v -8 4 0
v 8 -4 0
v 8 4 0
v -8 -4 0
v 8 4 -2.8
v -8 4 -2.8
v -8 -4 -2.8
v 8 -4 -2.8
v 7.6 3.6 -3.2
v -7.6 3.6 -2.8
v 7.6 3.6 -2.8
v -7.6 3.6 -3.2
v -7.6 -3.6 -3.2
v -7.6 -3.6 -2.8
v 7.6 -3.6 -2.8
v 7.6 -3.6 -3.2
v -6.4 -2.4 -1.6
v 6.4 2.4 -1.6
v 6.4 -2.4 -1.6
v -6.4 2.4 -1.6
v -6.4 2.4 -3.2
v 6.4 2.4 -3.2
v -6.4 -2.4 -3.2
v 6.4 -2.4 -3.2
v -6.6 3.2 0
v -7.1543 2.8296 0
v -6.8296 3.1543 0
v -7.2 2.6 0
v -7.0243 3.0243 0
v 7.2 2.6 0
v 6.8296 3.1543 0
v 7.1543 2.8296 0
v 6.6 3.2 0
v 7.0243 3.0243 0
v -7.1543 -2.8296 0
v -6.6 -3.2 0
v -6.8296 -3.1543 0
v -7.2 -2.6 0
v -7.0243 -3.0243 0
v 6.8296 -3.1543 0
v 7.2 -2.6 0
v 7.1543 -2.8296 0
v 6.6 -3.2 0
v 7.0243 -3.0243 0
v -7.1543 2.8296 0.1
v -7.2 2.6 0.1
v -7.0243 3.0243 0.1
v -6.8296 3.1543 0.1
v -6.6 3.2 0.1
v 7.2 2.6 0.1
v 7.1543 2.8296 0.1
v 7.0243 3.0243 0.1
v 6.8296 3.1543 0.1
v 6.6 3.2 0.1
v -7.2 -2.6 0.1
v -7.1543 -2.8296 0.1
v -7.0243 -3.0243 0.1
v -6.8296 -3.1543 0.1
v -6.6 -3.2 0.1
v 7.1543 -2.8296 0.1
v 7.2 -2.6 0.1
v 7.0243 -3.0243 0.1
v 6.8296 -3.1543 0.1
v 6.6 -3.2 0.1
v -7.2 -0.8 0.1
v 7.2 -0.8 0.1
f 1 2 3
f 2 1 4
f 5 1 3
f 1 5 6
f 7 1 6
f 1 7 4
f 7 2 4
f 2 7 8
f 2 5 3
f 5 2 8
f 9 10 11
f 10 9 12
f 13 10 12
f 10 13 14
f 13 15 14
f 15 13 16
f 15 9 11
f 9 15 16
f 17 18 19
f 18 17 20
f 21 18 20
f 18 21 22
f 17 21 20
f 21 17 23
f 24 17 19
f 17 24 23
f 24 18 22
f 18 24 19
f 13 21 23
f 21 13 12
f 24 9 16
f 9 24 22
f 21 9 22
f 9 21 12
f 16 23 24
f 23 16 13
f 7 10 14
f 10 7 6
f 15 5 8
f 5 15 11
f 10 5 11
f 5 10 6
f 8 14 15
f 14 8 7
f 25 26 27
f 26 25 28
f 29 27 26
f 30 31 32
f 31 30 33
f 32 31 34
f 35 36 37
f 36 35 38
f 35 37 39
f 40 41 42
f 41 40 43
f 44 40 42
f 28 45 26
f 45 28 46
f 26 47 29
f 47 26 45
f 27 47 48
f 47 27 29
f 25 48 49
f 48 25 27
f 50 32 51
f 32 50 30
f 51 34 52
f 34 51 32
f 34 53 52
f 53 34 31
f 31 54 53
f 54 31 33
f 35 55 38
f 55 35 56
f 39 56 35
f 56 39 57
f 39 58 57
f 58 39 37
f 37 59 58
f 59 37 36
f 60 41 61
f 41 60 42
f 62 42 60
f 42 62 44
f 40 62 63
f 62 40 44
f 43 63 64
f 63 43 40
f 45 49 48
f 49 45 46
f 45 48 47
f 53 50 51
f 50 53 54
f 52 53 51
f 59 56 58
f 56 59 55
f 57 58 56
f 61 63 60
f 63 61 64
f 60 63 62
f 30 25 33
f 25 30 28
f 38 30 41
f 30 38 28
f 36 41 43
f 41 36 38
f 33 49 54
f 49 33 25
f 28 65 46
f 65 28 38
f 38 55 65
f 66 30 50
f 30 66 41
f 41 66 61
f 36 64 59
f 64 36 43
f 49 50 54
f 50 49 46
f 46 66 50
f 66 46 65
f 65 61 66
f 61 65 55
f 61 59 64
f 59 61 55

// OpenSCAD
// file: ../p/box5.scad
use <../lib.scad>
function ldraw_lib__box5() = [
// 0 Box with 5 Faces and All Edges
// 0 Name: box5.dat
// 0 Author: James Jessiman
// 0 !LDRAW_ORG Primitive UPDATE 2012-01
// 0 !LICENSE Licensed under CC BY 4.0 : see CAreadme.txt
// 
// 0 BFC CERTIFY CCW
  [0,"BFC","CERTIFY"],
  [0,"BFC","CCW"],
// 
// 0 !HISTORY 2002-04-03 [sbliss] Modified for BFC compliance
// 0 !HISTORY 2002-04-25 [PTadmin] Official Update 2002-02
// 0 !HISTORY 2007-06-24 [PTadmin] Header formatted for Contributor Agreement
// 0 !HISTORY 2008-07-01 [PTadmin] Official Update 2008-01
// 0 !HISTORY 2012-02-16 [Philo] Changed to CCW
// 0 !HISTORY 2012-03-30 [PTadmin] Official Update 2012-01
// 
// 
// 2 24 1 1 1 -1 1 1
  [2,24,1,1,1,-1,1,1],
// 2 24 -1 1 1 -1 1 -1
  [2,24,-1,1,1,-1,1,-1],
// 2 24 -1 1 -1 1 1 -1
  [2,24,-1,1,-1,1,1,-1],
// 2 24 1 1 -1 1 1 1
  [2,24,1,1,-1,1,1,1],
// 2 24 1 0 1 -1 0 1
  [2,24,1,0,1,-1,0,1],
// 2 24 -1 0 1 -1 0 -1
  [2,24,-1,0,1,-1,0,-1],
// 2 24 -1 0 -1 1 0 -1
  [2,24,-1,0,-1,1,0,-1],
// 2 24 1 0 -1 1 0 1
  [2,24,1,0,-1,1,0,1],
// 2 24 1 0 1 1 1 1
  [2,24,1,0,1,1,1,1],
// 2 24 -1 0 1 -1 1 1
  [2,24,-1,0,1,-1,1,1],
// 2 24 1 0 -1 1 1 -1
  [2,24,1,0,-1,1,1,-1],
// 2 24 -1 0 -1 -1 1 -1
  [2,24,-1,0,-1,-1,1,-1],
// 4 16 -1 1 1 1 1 1 1 1 -1 -1 1 -1
  [4,16,-1,1,1,1,1,1,1,1,-1,-1,1,-1],
// 4 16 -1 1 1 -1 0 1 1 0 1 1 1 1
  [4,16,-1,1,1,-1,0,1,1,0,1,1,1,1],
// 4 16 -1 1 -1 -1 0 -1 -1 0 1 -1 1 1
  [4,16,-1,1,-1,-1,0,-1,-1,0,1,-1,1,1],
// 4 16 1 1 -1 1 0 -1 -1 0 -1 -1 1 -1
  [4,16,1,1,-1,1,0,-1,-1,0,-1,-1,1,-1],
// 4 16 1 1 1 1 0 1 1 0 -1 1 1 -1
  [4,16,1,1,1,1,0,1,1,0,-1,1,1,-1],
];
module ldraw_lib__box5(step=0, col=false, unit=2/5, alt=false, line=0.2, solid=!$preview)
    makepoly(ldraw_lib__box5(), step=step, col=col, unit=unit, alt=alt, line=line, solid=solid);
ldraw_lib__box5(line=0.2);
// file: ../p/box4.scad
use <../lib.scad>
function ldraw_lib__box4() = [
// 0 Box with 4 Faces (2 Parallel Pairs) and All Edges
// 0 Name: box4.dat
// 0 Author: James Jessiman
// 0 !LDRAW_ORG Primitive UPDATE 2012-01
// 0 !LICENSE Licensed under CC BY 4.0 : see CAreadme.txt
// 
// 0 BFC CERTIFY CCW
  [0,"BFC","CERTIFY"],
  [0,"BFC","CCW"],
// 
// 0 !HISTORY 2002-04-03 [sbliss] Modified for BFC compliance
// 0 !HISTORY 2002-04-25 [PTadmin] Official Update 2002-02
// 0 !HISTORY 2007-06-24 [PTadmin] Header formatted for Contributor Agreement
// 0 !HISTORY 2008-07-01 [PTadmin] Official Update 2008-01
// 0 !HISTORY 2012-02-16 [Philo] Changed to CCW
// 0 !HISTORY 2012-03-30 [PTadmin] Official Update 2012-01
// 
// 
// 2 24 1 1 1 -1 1 1
  [2,24,1,1,1,-1,1,1],
// 2 24 -1 1 1 -1 1 -1
  [2,24,-1,1,1,-1,1,-1],
// 2 24 -1 1 -1 1 1 -1
  [2,24,-1,1,-1,1,1,-1],
// 2 24 1 1 -1 1 1 1
  [2,24,1,1,-1,1,1,1],
// 2 24 1 0 1 -1 0 1
  [2,24,1,0,1,-1,0,1],
// 2 24 -1 0 1 -1 0 -1
  [2,24,-1,0,1,-1,0,-1],
// 2 24 -1 0 -1 1 0 -1
  [2,24,-1,0,-1,1,0,-1],
// 2 24 1 0 -1 1 0 1
  [2,24,1,0,-1,1,0,1],
// 2 24 1 0 1 1 1 1
  [2,24,1,0,1,1,1,1],
// 2 24 -1 0 1 -1 1 1
  [2,24,-1,0,1,-1,1,1],
// 2 24 1 0 -1 1 1 -1
  [2,24,1,0,-1,1,1,-1],
// 2 24 -1 0 -1 -1 1 -1
  [2,24,-1,0,-1,-1,1,-1],
// 4 16 -1 1 1 -1 0 1 1 0 1 1 1 1
  [4,16,-1,1,1,-1,0,1,1,0,1,1,1,1],
// 4 16 -1 1 -1 -1 0 -1 -1 0 1 -1 1 1
  [4,16,-1,1,-1,-1,0,-1,-1,0,1,-1,1,1],
// 4 16 1 1 -1 1 0 -1 -1 0 -1 -1 1 -1
  [4,16,1,1,-1,1,0,-1,-1,0,-1,-1,1,-1],
// 4 16 1 1 1 1 0 1 1 0 -1 1 1 -1
  [4,16,1,1,1,1,0,1,1,0,-1,1,1,-1],
];
module ldraw_lib__box4(step=0, col=false, unit=2/5, alt=false, line=0.2, solid=!$preview)
    makepoly(ldraw_lib__box4(), step=step, col=col, unit=unit, alt=alt, line=line, solid=solid);
ldraw_lib__box4(line=0.2);
// file: ../p/1-4cyli.scad
use <../lib.scad>
function ldraw_lib__1_4cyli() = [
// 0 Cylinder 0.25
// 0 Name: 1-4cyli.dat
// 0 Author: James Jessiman
// 0 !LDRAW_ORG Primitive UPDATE 2012-01
// 0 !LICENSE Licensed under CC BY 4.0 : see CAreadme.txt
// 
// 0 BFC CERTIFY CCW
  [0,"BFC","CERTIFY"],
  [0,"BFC","CCW"],
// 
// 0 !HISTORY 2002-03-23 [sbliss] Added BFC statement.
// 0 !HISTORY 2002-04-25 [PTadmin] Official Update 2002-02
// 0 !HISTORY 2007-06-22 [PTadmin] Header formatted for Contributor Agreement
// 0 !HISTORY 2008-07-01 [PTadmin] Official Update 2008-01
// 0 !HISTORY 2012-02-16 [Philo] Changed to CCW
// 0 !HISTORY 2012-03-30 [PTadmin] Official Update 2012-01
// 
// 
// 4 16 1 1 0 0.9239 1 0.3827 0.9239 0 0.3827 1 0 0
  [4,16,1,1,0,0.9239,1,0.3827,0.9239,0,0.3827,1,0,0],
// 5 24 1 0 0 1 1 0 0.9239 0 0.3827 1 0 -1
  [5,24,1,0,0,1,1,0,0.9239,0,0.3827,1,0,-1],
// 4 16 0.9239 1 0.3827 0.7071 1 0.7071 0.7071 0 0.7071 0.9239 0 0.3827
  [4,16,0.9239,1,0.3827,0.7071,1,0.7071,0.7071,0,0.7071,0.9239,0,0.3827],
// 5 24 0.9239 0 0.3827 0.9239 1 0.3827 0.7071 0 0.7071 1 0 0
  [5,24,0.9239,0,0.3827,0.9239,1,0.3827,0.7071,0,0.7071,1,0,0],
// 4 16 0.7071 1 0.7071 0.3827 1 0.9239 0.3827 0 0.9239 0.7071 0 0.7071
  [4,16,0.7071,1,0.7071,0.3827,1,0.9239,0.3827,0,0.9239,0.7071,0,0.7071],
// 5 24 0.7071 0 0.7071 0.7071 1 0.7071 0.3827 0 0.9239 0.9239 0 0.3827
  [5,24,0.7071,0,0.7071,0.7071,1,0.7071,0.3827,0,0.9239,0.9239,0,0.3827],
// 4 16 0.3827 1 0.9239 0 1 1 0 0 1 0.3827 0 0.9239
  [4,16,0.3827,1,0.9239,0,1,1,0,0,1,0.3827,0,0.9239],
// 5 24 0.3827 0 0.9239 0.3827 1 0.9239 0 0 1 0.7071 0 0.7071
  [5,24,0.3827,0,0.9239,0.3827,1,0.9239,0,0,1,0.7071,0,0.7071],
// 5 24 0 0 1 0 1 1 0.3827 0 0.9239 -1 0 1
  [5,24,0,0,1,0,1,1,0.3827,0,0.9239,-1,0,1],
];
module ldraw_lib__1_4cyli(step=0, col=false, unit=2/5, alt=false, line=0.2, solid=!$preview)
    makepoly(ldraw_lib__1_4cyli(), step=step, col=col, unit=unit, alt=alt, line=line, solid=solid);
ldraw_lib__1_4cyli(line=0.2);
// file: ../p/1-4chrd.scad
use <../lib.scad>
function ldraw_lib__1_4chrd() = [
// 0 Chord 0.25
// 0 Name: 1-4chrd.dat
// 0 Author: Max Martin Richter [MMR1988]
// 0 !LDRAW_ORG Primitive UPDATE 2023-05
// 0 !LICENSE Licensed under CC BY 4.0 : see CAreadme.txt
// 
// 0 BFC CERTIFY CCW
  [0,"BFC","CERTIFY"],
  [0,"BFC","CCW"],
// 
// 0 !HISTORY 2004-04-22 [PTadmin] Official Update 2004-02
// 0 !HISTORY 2007-10-09 [PTadmin] Header formatted for Contributor Agreement
// 0 !HISTORY 2008-07-01 [PTadmin] Official Update 2008-01
// 0 !HISTORY 2012-08-02 [MMR1988] Re-creation with PrimGen2 and Rectifier
// 0 !HISTORY 2012-08-09 [PTadmin] Official Update 2012-02
// 0 !HISTORY 2023-10-27 [OrionP] Change author to MMR1988 from hafhead
// 0 !HISTORY 2023-10-31 [OrionP] Official Update 2023-05
// 
// 4 16 0.9239 0 0.3827 0.3827 0 0.9239 0 0 1 1 0 0
  [4,16,0.9239,0,0.3827,0.3827,0,0.9239,0,0,1,1,0,0],
// 3 16 0.7071 0 0.7071 0.3827 0 0.9239 0.9239 0 0.3827
  [3,16,0.7071,0,0.7071,0.3827,0,0.9239,0.9239,0,0.3827],
];
module ldraw_lib__1_4chrd(step=0, col=false, unit=2/5, alt=false, line=0.2, solid=!$preview)
    makepoly(ldraw_lib__1_4chrd(), step=step, col=col, unit=unit, alt=alt, line=line, solid=solid);
ldraw_lib__1_4chrd(line=0.2);
// file: s/3069bs01.scad
use <../../lib.scad>
use <../../p/box4.scad>
use <../../p/box5.scad>
function ldraw_lib__s__3069bs01() = [
// 0 ~Tile  1 x  2 with Groove without Top Face
// 0 Name: s\3069bs01.dat
// 0 Author: Santeri Piippo [arezey]
// 0 !LDRAW_ORG Subpart UPDATE 2010-02
// 0 !LICENSE Licensed under CC BY 4.0 : see CAreadme.txt
// 
// 0 BFC CERTIFY CCW
  [0,"BFC","CERTIFY"],
  [0,"BFC","CCW"],
// 
// 0 !HISTORY 2010-07-05 [PTadmin] Official Update 2010-02
// 
// 
// 1 16 0 0 0 20 0 0 0 7 0 0 0 10 box4.dat
  [1,16,0,0,0,20,0,0,0,7,0,0,0,10, ldraw_lib__box4()],
// 1 16 0 7 0 19 0 0 0 1 0 0 0 9 box4.dat
  [1,16,0,7,0,19,0,0,0,1,0,0,0,9, ldraw_lib__box4()],
// 0 BFC INVERTNEXT
  [0,"BFC","INVERTNEXT"],
// 1 16 0 8 0 16 0 0 0 -4 0 0 0 6 box5.dat
  [1,16,0,8,0,16,0,0,0,-4,0,0,0,6, ldraw_lib__box5()],
// 4 16 -19 8 9 -16 8 6 -16 8 -6 -19 8 -9
  [4,16,-19,8,9,-16,8,6,-16,8,-6,-19,8,-9],
// 4 16 19 8 -9 16 8 -6 16 8 6 19 8 9
  [4,16,19,8,-9,16,8,-6,16,8,6,19,8,9],
// 4 16 19 8 9 16 8 6 -16 8 6 -19 8 9
  [4,16,19,8,9,16,8,6,-16,8,6,-19,8,9],
// 4 16 -19 8 -9 -16 8 -6 16 8 -6 19 8 -9
  [4,16,-19,8,-9,-16,8,-6,16,8,-6,19,8,-9],
// 4 16 -20 7 10 -19 7 9 -19 7 -9 -20 7 -10
  [4,16,-20,7,10,-19,7,9,-19,7,-9,-20,7,-10],
// 4 16 20 7 -10 19 7 -9 19 7 9 20 7 10
  [4,16,20,7,-10,19,7,-9,19,7,9,20,7,10],
// 4 16 20 7 10 19 7 9 -19 7 9 -20 7 10
  [4,16,20,7,10,19,7,9,-19,7,9,-20,7,10],
// 4 16 -20 7 -10 -19 7 -9 19 7 -9 20 7 -10
  [4,16,-20,7,-10,-19,7,-9,19,7,-9,20,7,-10],
// 0 //
];
module ldraw_lib__s__3069bs01(step=0, col=false, unit=2/5, alt=false, line=0.2, solid=!$preview)
    makepoly(ldraw_lib__s__3069bs01(), step=step, col=col, unit=unit, alt=alt, line=line, solid=solid);
ldraw_lib__s__3069bs01(line=0.2);
// file: 6141875p.scad
use <../lib.scad>
use <../p/1-4chrd.scad>
use <../p/1-4cyli.scad>
function ldraw_lib__6141875p() = [
// 0 Sticker  0.8 x  1.8 with Black Stripe on Blue Background
// 0 Name: 6141875p.dat
// 0 Author: Massimo Maso [Sirio]
// 0 !LDRAW_ORG Part UPDATE 2022-06
// 0 !LICENSE Licensed under CC BY 4.0 : see CAreadme.txt
// 
// 0 BFC CERTIFY CCW
  [0,"BFC","CERTIFY"],
  [0,"BFC","CCW"],
// 
// 0 !KEYWORDS Bricklink 75875stk01, Brickowl 53567, F-150, Ford, Raptor
// 0 !KEYWORDS Rebrickable 24760, Set 75875, Speed Champions
// 
// 0 !HISTORY 2022-12-20 [PTadmin] Official Update 2022-06
// 
// 
// 0 // Primitives
// 
// 1 16 -16.5 0 6.5 -1.5 0 0 0 -1 0 0 0 1.5 1-4chrd.dat
  [1,16,-16.5,0,6.5,-1.5,0,0,0,-1,0,0,0,1.5, ldraw_lib__1_4chrd()],
// 1 16 16.5 0 6.5 1.5 0 0 0 -1 0 0 0 1.5 1-4chrd.dat
  [1,16,16.5,0,6.5,1.5,0,0,0,-1,0,0,0,1.5, ldraw_lib__1_4chrd()],
// 1 16 -16.5 0 -6.5 -1.5 0 0 0 -1 0 0 0 -1.5 1-4chrd.dat
  [1,16,-16.5,0,-6.5,-1.5,0,0,0,-1,0,0,0,-1.5, ldraw_lib__1_4chrd()],
// 1 16 16.5 0 -6.5 1.5 0 0 0 -1 0 0 0 -1.5 1-4chrd.dat
  [1,16,16.5,0,-6.5,1.5,0,0,0,-1,0,0,0,-1.5, ldraw_lib__1_4chrd()],
// 1 16 -16.5 0 6.5 -1.5 0 0 0 -.25 0 0 0 1.5 1-4cyli.dat
  [1,16,-16.5,0,6.5,-1.5,0,0,0,-.25,0,0,0,1.5, ldraw_lib__1_4cyli()],
// 1 16 16.5 0 6.5 1.5 0 0 0 -.25 0 0 0 1.5 1-4cyli.dat
  [1,16,16.5,0,6.5,1.5,0,0,0,-.25,0,0,0,1.5, ldraw_lib__1_4cyli()],
// 1 16 -16.5 0 -6.5 -1.5 0 0 0 -.25 0 0 0 -1.5 1-4cyli.dat
  [1,16,-16.5,0,-6.5,-1.5,0,0,0,-.25,0,0,0,-1.5, ldraw_lib__1_4cyli()],
// 1 16 16.5 0 -6.5 1.5 0 0 0 -.25 0 0 0 -1.5 1-4cyli.dat
  [1,16,16.5,0,-6.5,1.5,0,0,0,-.25,0,0,0,-1.5, ldraw_lib__1_4cyli()],
// 1 0 -16.5 -.25 6.5 -1.5 0 0 0 1 0 0 0 1.5 1-4chrd.dat
  [1,0,-16.5,-.25,6.5,-1.5,0,0,0,1,0,0,0,1.5, ldraw_lib__1_4chrd()],
// 1 0 16.5 -.25 6.5 1.5 0 0 0 1 0 0 0 1.5 1-4chrd.dat
  [1,0,16.5,-.25,6.5,1.5,0,0,0,1,0,0,0,1.5, ldraw_lib__1_4chrd()],
// 1 1 -16.5 -.25 -6.5 -1.5 0 0 0 1 0 0 0 -1.5 1-4chrd.dat
  [1,1,-16.5,-.25,-6.5,-1.5,0,0,0,1,0,0,0,-1.5, ldraw_lib__1_4chrd()],
// 1 1 16.5 -.25 -6.5 1.5 0 0 0 1 0 0 0 -1.5 1-4chrd.dat
  [1,1,16.5,-.25,-6.5,1.5,0,0,0,1,0,0,0,-1.5, ldraw_lib__1_4chrd()],
// 0 // Bottom face
// 4 16 16.5 0 8 18 0 6.5 -18 0 6.5 -16.5 0 8
  [4,16,16.5,0,8,18,0,6.5,-18,0,6.5,-16.5,0,8],
// 4 16 18 0 6.5 18 0 -6.5 -18 0 -6.5 -18 0 6.5
  [4,16,18,0,6.5,18,0,-6.5,-18,0,-6.5,-18,0,6.5],
// 4 16 16.5 0 -8 -16.5 0 -8 -18 0 -6.5 18 0 -6.5
  [4,16,16.5,0,-8,-16.5,0,-8,-18,0,-6.5,18,0,-6.5],
// 0 // Lateral face
// 4 16 -16.5 0 8 -16.5 -.25 8 16.5 -.25 8 16.5 0 8
  [4,16,-16.5,0,8,-16.5,-.25,8,16.5,-.25,8,16.5,0,8],
// 4 16 -18 0 6.5 -18 0 -6.5 -18 -.25 -2 -18 -.25 6.5
  [4,16,-18,0,6.5,-18,0,-6.5,-18,-.25,-2,-18,-.25,6.5],
// 3 16 -18 0 -6.5 -18 -.25 -6.5 -18 -.25 -2
  [3,16,-18,0,-6.5,-18,-.25,-6.5,-18,-.25,-2],
// 4 16 18 0 6.5 18 -.25 6.5 18 -.25 -2 18 0 -6.5
  [4,16,18,0,6.5,18,-.25,6.5,18,-.25,-2,18,0,-6.5],
// 3 16 18 0 -6.5 18 -.25 -2 18 -.25 -6.5
  [3,16,18,0,-6.5,18,-.25,-2,18,-.25,-6.5],
// 4 16 -16.5 0 -8 16.5 0 -8 16.5 -.25 -8 -16.5 -.25 -8
  [4,16,-16.5,0,-8,16.5,0,-8,16.5,-.25,-8,-16.5,-.25,-8],
// 0 // Top face
// 0 // Black faces
// 4 0 -18 -.25 6.5 18 -.25 6.5 16.5 -.25 8 -16.5 -.25 8
  [4,0,-18,-.25,6.5,18,-.25,6.5,16.5,-.25,8,-16.5,-.25,8],
// 4 0 -18 -.25 6.5 -18 -.25 -2 18 -.25 -2 18 -.25 6.5
  [4,0,-18,-.25,6.5,-18,-.25,-2,18,-.25,-2,18,-.25,6.5],
// 0 // Blue faces
// 4 1 -18 -.25 -6.5 18 -.25 -6.5 18 -.25 -2 -18 -.25 -2
  [4,1,-18,-.25,-6.5,18,-.25,-6.5,18,-.25,-2,-18,-.25,-2],
// 4 1 -18 -.25 -6.5 -16.5 -.25 -8 16.5 -.25 -8 18 -.25 -6.5
  [4,1,-18,-.25,-6.5,-16.5,-.25,-8,16.5,-.25,-8,18,-.25,-6.5],
];
module ldraw_lib__6141875p(step=0, col=false, unit=2/5, alt=false, line=0.2, solid=!$preview)
    makepoly(ldraw_lib__6141875p(), step=step, col=col, unit=unit, alt=alt, line=line, solid=solid);
ldraw_lib__6141875p(line=0.2);
// file: 3069b.scad
use <../lib.scad>
use <s/3069bs01.scad>
function ldraw_lib__3069b() = [
// 0 Tile  1 x  2 with Groove
// 0 Name: 3069b.dat
// 0 Author: Santeri Piippo [arezey]
// 0 !LDRAW_ORG Part UPDATE 2010-02
// 0 !LICENSE Licensed under CC BY 4.0 : see CAreadme.txt
// 
// 0 BFC CERTIFY CCW
  [0,"BFC","CERTIFY"],
  [0,"BFC","CCW"],
// 
// 0 !KEYWORDS BrickLink 3069
// 
// 0 !HISTORY 2010-07-05 [PTadmin] Official Update 2010-02
// 
// 
// 4 16 20 0 -10 20 0 10 -20 0 10 -20 0 -10
  [4,16,20,0,-10,20,0,10,-20,0,10,-20,0,-10],
// 1 16 0 0 0 1 0 0 0 1 0 0 0 1 s\3069bs01.dat
  [1,16,0,0,0,1,0,0,0,1,0,0,0,1, ldraw_lib__s__3069bs01()],
// 0 //
];
module ldraw_lib__3069b(step=0, col=false, unit=2/5, alt=false, line=0.2, solid=!$preview)
    makepoly(ldraw_lib__3069b(), step=step, col=col, unit=unit, alt=alt, line=line, solid=solid);
ldraw_lib__3069b(line=0.2);
// main file
use <../lib.scad>
use <3069b.scad>
use <6141875p.scad>
function ldraw_lib__3069bd2r() = [
// 0 Tile  1 x  2 with Black Stripe on Blue Background Sticker
// 0 Name: 3069bd2r.dat
// 0 Author: Alfred Schmitz [AlfredS]
// 0 !LDRAW_ORG Shortcut UPDATE 2026-08
// 0 !LICENSE Licensed under CC BY 4.0 : see CAreadme.txt
// 
// 0 BFC CERTIFY CCW
  [0,"BFC","CERTIFY"],
  [0,"BFC","CCW"],
// 
// 0 !CATEGORY Sticker Shortcut
// 0 !KEYWORDS F-150, Ford, Raptor, Set 75875, Speed Champions
// 
// 0 !HISTORY 2026-08-31 [OrionP] Official Update 2026-08
// 
// 1 16 0 0 0 1 0 0 0 1 0 0 0 1 3069b.dat
  [1,16,0,0,0,1,0,0,0,1,0,0,0,1, ldraw_lib__3069b()],
// 1 16 0 0 0 1 0 0 0 1 0 0 0 1 6141875p.dat
  [1,16,0,0,0,1,0,0,0,1,0,0,0,1, ldraw_lib__6141875p()],
];
module ldraw_lib__3069bd2r(step=0, col=false, unit=2/5, alt=false, line=0.2, solid=!$preview)
    makepoly(ldraw_lib__3069bd2r(), step=step, col=col, unit=unit, alt=alt, line=line, solid=solid);
ldraw_lib__3069bd2r(line=0.2);
